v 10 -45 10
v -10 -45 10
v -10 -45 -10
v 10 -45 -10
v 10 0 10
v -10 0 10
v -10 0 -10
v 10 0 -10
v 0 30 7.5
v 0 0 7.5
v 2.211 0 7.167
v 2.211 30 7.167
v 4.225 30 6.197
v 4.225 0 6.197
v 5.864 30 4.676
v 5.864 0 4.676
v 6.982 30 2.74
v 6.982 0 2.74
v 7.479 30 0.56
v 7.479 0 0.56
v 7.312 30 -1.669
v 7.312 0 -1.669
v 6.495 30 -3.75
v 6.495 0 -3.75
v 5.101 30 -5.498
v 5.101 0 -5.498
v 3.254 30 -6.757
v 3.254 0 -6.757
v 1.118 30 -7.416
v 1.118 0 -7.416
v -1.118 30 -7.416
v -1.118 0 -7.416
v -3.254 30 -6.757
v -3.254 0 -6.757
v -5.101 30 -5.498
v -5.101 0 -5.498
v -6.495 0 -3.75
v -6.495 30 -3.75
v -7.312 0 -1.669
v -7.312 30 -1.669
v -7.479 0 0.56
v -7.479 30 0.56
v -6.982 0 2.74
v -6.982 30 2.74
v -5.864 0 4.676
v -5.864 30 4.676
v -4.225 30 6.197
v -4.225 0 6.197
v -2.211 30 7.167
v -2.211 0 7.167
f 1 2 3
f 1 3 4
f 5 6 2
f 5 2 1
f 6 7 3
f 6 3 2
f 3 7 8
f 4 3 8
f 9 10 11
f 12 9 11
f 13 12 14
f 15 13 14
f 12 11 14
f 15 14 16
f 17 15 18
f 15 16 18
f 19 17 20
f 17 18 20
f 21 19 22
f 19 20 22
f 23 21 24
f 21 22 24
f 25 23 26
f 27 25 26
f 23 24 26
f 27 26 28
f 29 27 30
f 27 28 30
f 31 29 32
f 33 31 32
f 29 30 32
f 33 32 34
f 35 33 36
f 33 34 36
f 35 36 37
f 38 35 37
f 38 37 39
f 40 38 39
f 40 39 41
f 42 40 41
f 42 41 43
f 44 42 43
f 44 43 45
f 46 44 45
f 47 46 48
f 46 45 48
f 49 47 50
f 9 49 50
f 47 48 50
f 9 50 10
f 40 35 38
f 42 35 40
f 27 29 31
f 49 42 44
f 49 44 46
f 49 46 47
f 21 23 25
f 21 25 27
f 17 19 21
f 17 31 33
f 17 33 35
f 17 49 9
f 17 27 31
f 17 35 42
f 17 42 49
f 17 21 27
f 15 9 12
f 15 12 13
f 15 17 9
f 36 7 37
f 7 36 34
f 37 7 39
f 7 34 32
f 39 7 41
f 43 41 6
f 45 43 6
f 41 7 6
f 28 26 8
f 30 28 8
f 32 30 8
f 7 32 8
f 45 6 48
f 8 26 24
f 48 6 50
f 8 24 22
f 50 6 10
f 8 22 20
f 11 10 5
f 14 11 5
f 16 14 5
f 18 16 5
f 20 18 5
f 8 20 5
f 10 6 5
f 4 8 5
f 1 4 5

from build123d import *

# Parameters (mm, degrees)
SKETCH_3_R      = 7.5
EXTRUDE_3_DEPTH = 30
SKETCH_4_W      = 20
SKETCH_4_H      = 20
EXTRUDE_4_DEPTH = 45


with BuildPart() as part:
    # ｽｹｯﾁ3 → ﾎﾞｽ - 押し出し3 (new body)
    with BuildSketch(Plane(origin=(0, 0, 0), x_dir=(1, 0, 0), z_dir=(0, 1, 0))):
        with Locations(Location((0, 0, 0), (0, 0, 270))):
            Circle(SKETCH_3_R)
    extrude(amount=EXTRUDE_3_DEPTH)

    # ｽｹｯﾁ4 → ﾎﾞｽ - 押し出し4 (add)
    with BuildSketch(Plane.XZ):
        Rectangle(SKETCH_4_W, SKETCH_4_H)
    extrude(amount=EXTRUDE_4_DEPTH)


solid = part.part
